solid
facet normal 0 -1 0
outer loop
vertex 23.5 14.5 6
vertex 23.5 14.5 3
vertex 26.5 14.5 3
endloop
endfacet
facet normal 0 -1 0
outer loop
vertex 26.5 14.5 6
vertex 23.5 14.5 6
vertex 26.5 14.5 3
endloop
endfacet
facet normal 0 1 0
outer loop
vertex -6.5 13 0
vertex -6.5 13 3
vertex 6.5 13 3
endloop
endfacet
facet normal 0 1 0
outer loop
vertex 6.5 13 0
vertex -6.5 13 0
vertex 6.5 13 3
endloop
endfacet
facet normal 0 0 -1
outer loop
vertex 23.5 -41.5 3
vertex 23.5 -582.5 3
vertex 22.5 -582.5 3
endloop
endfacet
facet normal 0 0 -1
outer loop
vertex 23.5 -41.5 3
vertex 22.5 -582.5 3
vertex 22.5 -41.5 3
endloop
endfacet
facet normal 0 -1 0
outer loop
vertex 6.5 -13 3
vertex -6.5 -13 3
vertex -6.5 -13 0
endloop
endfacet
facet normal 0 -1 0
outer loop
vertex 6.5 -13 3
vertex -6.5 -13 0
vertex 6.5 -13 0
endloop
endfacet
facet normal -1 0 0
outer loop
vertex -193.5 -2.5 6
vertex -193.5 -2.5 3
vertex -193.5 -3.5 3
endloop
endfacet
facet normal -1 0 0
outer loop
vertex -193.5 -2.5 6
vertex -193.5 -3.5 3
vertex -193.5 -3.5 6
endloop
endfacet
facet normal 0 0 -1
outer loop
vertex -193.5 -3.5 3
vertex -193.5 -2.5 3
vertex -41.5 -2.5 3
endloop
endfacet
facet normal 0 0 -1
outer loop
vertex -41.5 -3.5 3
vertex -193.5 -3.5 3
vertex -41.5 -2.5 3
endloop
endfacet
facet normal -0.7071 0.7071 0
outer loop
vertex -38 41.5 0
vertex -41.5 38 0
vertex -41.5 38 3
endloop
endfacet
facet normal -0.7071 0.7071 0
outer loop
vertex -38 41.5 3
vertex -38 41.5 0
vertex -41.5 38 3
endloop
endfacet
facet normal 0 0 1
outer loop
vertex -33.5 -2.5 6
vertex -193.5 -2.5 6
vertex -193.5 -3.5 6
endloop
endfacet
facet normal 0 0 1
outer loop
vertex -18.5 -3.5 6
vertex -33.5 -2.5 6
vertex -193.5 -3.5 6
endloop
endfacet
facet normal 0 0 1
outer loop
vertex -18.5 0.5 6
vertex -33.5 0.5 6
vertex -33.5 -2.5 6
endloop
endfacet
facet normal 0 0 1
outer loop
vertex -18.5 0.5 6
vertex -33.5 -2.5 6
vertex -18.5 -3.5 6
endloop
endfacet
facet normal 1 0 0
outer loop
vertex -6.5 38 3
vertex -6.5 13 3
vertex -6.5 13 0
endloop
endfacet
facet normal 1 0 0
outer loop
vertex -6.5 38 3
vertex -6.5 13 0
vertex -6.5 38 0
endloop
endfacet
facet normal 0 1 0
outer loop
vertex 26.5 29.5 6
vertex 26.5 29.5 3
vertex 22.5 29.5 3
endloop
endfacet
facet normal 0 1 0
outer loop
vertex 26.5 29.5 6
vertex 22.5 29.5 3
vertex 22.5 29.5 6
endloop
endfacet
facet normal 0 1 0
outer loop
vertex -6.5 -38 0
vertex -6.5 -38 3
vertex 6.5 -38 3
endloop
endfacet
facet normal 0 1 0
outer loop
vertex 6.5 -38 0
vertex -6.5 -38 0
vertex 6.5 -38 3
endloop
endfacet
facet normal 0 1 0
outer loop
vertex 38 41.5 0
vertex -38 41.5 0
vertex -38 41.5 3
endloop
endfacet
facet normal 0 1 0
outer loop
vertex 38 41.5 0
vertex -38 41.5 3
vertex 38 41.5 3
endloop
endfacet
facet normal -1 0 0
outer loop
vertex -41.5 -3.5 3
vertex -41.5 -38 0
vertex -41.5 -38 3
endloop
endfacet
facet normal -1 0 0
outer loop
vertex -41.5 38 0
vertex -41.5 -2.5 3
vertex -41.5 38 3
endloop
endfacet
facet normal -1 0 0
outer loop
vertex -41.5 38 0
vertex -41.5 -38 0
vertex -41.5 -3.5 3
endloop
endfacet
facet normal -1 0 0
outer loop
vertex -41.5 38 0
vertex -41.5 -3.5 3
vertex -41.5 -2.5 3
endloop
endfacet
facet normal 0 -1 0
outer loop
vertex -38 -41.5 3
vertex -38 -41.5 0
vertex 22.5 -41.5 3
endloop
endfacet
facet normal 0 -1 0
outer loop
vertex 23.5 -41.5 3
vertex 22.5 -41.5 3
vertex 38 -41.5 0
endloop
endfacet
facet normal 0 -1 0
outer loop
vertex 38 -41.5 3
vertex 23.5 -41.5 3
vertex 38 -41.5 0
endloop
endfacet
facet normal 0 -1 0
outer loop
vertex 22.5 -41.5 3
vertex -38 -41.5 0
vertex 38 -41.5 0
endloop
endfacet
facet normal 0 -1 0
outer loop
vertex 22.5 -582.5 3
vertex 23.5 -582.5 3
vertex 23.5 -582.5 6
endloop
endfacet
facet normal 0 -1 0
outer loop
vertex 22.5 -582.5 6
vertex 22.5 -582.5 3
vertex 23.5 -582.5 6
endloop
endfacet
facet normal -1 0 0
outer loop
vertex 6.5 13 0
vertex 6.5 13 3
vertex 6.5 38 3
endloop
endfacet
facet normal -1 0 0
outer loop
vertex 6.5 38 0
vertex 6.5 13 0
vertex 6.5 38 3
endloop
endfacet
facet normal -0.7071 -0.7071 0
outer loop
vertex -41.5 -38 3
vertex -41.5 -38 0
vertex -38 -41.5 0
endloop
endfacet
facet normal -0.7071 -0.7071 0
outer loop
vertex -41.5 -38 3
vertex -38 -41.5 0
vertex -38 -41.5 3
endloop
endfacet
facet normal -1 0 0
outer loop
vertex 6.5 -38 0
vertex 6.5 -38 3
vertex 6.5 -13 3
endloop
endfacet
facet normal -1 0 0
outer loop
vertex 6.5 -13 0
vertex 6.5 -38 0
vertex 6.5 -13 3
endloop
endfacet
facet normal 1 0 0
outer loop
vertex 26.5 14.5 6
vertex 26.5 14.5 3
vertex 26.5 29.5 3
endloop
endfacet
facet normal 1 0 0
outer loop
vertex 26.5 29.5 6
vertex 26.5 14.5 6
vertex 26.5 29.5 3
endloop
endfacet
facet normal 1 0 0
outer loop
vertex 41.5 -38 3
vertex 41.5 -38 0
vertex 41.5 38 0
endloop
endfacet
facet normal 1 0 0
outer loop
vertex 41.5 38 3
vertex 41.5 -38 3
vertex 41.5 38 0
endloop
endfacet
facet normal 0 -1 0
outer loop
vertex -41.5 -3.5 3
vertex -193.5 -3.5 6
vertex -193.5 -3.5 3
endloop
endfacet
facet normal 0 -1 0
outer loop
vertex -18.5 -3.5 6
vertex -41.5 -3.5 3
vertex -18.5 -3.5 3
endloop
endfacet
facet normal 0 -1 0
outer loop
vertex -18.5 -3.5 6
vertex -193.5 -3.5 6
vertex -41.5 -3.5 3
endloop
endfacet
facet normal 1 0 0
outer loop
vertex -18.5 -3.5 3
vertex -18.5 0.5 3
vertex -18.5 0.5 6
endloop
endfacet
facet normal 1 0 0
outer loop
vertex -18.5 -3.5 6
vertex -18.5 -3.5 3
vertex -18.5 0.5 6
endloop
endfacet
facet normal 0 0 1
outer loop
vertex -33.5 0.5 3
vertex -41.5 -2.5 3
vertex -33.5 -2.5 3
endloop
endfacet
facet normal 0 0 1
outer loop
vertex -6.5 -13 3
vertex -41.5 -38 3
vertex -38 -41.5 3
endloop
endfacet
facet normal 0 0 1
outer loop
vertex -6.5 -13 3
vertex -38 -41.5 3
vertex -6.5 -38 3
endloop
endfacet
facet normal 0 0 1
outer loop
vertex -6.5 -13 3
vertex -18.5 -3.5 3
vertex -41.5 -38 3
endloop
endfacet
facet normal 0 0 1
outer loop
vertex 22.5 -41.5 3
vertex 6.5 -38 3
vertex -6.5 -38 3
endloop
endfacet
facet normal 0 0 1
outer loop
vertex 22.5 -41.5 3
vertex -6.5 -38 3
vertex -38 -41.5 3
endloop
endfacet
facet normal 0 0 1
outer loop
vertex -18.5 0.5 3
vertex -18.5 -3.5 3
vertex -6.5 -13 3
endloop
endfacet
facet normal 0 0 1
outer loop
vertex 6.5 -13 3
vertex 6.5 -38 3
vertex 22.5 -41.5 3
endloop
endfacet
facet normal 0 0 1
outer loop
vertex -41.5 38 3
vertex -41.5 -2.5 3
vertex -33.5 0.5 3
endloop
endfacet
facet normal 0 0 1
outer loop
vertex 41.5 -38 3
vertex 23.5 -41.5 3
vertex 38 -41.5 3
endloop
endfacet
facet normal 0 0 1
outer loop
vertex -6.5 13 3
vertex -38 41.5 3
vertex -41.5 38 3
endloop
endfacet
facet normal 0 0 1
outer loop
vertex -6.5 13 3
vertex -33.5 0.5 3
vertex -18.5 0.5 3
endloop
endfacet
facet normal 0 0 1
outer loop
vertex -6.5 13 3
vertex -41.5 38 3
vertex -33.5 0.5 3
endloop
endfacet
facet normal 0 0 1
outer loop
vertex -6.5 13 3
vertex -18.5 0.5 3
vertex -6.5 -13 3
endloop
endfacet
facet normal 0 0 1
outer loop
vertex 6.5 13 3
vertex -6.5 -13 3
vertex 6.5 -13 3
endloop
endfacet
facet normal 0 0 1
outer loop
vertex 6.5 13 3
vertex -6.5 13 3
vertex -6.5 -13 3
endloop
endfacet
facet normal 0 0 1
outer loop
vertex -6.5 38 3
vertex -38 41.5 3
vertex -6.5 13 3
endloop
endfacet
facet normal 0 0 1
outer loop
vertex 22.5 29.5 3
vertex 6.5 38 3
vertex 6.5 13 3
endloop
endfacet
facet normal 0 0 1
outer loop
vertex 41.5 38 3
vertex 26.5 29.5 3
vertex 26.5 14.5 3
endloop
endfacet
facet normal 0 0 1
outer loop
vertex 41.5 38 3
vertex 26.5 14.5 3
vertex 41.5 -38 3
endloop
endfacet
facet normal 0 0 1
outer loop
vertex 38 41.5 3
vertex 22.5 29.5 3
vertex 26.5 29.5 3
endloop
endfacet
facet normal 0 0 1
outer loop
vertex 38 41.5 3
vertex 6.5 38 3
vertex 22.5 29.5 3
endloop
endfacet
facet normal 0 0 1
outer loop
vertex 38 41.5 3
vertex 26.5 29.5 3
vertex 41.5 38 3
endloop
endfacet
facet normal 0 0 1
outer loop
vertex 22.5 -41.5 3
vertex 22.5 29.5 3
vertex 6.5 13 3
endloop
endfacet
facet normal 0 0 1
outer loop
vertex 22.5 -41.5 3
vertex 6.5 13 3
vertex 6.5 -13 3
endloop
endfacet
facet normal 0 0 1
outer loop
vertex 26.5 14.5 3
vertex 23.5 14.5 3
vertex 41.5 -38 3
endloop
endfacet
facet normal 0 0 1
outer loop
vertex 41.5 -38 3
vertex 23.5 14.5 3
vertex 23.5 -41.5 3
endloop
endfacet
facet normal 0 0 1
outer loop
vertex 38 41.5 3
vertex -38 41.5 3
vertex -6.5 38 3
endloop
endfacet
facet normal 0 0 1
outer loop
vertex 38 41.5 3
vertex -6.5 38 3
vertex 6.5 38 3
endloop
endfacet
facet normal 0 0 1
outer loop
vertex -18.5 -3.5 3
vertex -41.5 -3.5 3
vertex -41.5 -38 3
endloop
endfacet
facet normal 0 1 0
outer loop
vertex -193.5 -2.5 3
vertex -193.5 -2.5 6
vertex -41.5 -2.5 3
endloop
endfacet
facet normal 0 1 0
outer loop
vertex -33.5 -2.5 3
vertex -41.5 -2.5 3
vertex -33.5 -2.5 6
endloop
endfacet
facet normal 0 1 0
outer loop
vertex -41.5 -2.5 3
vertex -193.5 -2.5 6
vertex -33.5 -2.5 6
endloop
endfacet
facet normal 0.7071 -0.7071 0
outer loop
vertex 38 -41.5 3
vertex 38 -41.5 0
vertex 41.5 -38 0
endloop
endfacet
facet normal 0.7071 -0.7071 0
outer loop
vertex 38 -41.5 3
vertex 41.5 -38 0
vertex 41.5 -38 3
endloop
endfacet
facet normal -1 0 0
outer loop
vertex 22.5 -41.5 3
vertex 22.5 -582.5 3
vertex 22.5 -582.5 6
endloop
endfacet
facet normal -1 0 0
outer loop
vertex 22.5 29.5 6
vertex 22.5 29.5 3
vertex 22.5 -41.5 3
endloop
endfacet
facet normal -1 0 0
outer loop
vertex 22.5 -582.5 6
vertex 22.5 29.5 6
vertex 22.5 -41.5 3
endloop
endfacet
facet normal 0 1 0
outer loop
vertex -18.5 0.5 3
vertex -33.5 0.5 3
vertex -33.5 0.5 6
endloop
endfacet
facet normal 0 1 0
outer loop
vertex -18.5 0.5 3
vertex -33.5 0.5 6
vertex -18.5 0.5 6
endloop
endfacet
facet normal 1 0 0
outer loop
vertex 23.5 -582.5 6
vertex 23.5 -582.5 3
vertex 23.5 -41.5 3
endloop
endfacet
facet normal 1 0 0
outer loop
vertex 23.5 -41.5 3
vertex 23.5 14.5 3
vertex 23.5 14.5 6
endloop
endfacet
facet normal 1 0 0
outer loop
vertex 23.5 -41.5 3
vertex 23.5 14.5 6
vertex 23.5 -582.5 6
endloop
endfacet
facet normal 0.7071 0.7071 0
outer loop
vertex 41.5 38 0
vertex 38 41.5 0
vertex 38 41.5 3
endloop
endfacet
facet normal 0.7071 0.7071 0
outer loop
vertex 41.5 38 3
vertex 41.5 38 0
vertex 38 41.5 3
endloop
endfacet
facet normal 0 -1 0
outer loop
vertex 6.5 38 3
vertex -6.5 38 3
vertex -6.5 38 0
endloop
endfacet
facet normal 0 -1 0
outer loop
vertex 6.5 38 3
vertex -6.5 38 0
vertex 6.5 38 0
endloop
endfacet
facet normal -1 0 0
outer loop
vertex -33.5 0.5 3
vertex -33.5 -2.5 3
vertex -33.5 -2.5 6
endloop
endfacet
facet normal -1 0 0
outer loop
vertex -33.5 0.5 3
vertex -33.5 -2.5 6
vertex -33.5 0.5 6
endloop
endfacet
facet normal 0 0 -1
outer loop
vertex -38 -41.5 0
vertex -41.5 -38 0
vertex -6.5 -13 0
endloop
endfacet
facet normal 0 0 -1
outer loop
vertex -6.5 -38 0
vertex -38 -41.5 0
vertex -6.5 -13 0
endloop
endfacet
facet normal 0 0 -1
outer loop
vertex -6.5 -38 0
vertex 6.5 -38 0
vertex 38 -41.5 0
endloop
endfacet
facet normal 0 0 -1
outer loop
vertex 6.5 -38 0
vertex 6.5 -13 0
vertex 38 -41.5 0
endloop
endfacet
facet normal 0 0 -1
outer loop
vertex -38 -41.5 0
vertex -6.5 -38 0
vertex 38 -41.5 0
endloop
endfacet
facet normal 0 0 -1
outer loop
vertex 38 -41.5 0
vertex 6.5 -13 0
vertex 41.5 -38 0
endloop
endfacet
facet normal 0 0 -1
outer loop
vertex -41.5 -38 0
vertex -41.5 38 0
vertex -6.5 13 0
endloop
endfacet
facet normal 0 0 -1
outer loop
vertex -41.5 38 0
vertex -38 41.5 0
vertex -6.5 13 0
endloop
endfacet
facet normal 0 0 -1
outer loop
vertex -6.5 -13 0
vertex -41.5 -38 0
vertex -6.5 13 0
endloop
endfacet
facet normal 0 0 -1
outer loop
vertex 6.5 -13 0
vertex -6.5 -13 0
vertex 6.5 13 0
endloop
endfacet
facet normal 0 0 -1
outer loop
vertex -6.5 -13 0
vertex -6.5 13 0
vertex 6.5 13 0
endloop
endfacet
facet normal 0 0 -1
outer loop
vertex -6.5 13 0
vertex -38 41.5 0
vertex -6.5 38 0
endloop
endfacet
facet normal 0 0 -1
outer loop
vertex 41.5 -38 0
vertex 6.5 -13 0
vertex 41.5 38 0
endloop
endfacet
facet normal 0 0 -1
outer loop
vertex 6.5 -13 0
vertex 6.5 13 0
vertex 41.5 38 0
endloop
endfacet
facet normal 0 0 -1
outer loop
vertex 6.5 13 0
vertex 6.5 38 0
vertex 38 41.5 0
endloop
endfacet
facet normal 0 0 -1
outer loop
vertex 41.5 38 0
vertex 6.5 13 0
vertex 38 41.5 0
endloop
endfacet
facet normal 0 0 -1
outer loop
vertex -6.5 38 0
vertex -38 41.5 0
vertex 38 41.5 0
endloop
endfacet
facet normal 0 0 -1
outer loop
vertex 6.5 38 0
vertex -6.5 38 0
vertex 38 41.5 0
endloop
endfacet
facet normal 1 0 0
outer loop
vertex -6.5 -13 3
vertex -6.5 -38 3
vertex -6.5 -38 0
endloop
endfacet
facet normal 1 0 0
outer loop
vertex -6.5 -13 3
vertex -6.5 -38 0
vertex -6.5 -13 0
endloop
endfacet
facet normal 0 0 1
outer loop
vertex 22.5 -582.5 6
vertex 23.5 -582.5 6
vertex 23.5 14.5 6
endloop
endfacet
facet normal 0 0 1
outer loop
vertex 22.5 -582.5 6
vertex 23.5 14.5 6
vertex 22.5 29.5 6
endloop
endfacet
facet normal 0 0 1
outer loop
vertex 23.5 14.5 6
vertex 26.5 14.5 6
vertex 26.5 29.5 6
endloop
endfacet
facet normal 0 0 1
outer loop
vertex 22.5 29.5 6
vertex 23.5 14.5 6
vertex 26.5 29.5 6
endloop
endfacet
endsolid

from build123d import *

# Parameters (mm, degrees)
SKETCH1_W           = 83
SKETCH1_H           = 83
BOSS_EXTRUDE1_DEPTH = 3
SKETCH2_W           = 13
SKETCH2_H           = 25
CUT_EXTRUDE1_DEPTH  = 3
CHAMFER1_SIZE       = 3.5
SKETCH3_W           = 15
SKETCH3_H           = 3
SKETCH3_W_2         = 3
SKETCH3_H_2         = 15
BOSS_EXTRUDE2_DEPTH = 3
SKETCH4_W           = 3
SKETCH4_H           = 612
BOSS_EXTRUDE3_DEPTH = 1
SKETCH5_W           = 175
SKETCH5_H           = 3
BOSS_EXTRUDE4_DEPTH = 1


with BuildPart() as part:
    # Sketch1 → Boss-Extrude1 (new body)
    with BuildSketch(Plane.XY):
        Rectangle(SKETCH1_W, SKETCH1_H)
    extrude(amount=BOSS_EXTRUDE1_DEPTH)

    # Sketch2 → Cut-Extrude1 (cut)
    with BuildSketch(Plane.XY.offset(3)):
        with Locations((0, 25.5)):
            Rectangle(SKETCH2_W, SKETCH2_H)
        with Locations((0, -25.5)):
            Rectangle(SKETCH2_W, SKETCH2_H)
    extrude(amount=-CUT_EXTRUDE1_DEPTH, mode=Mode.SUBTRACT)

    # Chamfer1
    chamfer1_edges = [part.edges().sort_by_distance(p)[0] for p in [
        (-41.5, 41.5, 1.5),
        (41.5, 41.5, 1.5),
        (41.5, -41.5, 1.5),
        (-41.5, -41.5, 1.5),
    ]]
    chamfer(chamfer1_edges, length=CHAMFER1_SIZE)

    # Sketch3 → Boss-Extrude2 (add)
    with BuildSketch(Plane.XY.offset(3)):
        with Locations((-26, -1)):
            Rectangle(SKETCH3_W, SKETCH3_H)
        with Locations((25, 22)):
            Rectangle(SKETCH3_W_2, SKETCH3_H_2)
    extrude(amount=BOSS_EXTRUDE2_DEPTH)

    # Sketch4 → Boss-Extrude3 (add)
    with BuildSketch(Plane.ZY.offset(-23.5)):
        with Locations((4.5, -276.5)):
            Rectangle(SKETCH4_W, SKETCH4_H)
    extrude(amount=BOSS_EXTRUDE3_DEPTH)

    # Sketch5 → Boss-Extrude4 (add)
    with BuildSketch(Plane.XZ.offset(2.5)):
        with Locations((-106, 4.5)):
            Rectangle(SKETCH5_W, SKETCH5_H)
    extrude(amount=BOSS_EXTRUDE4_DEPTH)


solid = part.part
